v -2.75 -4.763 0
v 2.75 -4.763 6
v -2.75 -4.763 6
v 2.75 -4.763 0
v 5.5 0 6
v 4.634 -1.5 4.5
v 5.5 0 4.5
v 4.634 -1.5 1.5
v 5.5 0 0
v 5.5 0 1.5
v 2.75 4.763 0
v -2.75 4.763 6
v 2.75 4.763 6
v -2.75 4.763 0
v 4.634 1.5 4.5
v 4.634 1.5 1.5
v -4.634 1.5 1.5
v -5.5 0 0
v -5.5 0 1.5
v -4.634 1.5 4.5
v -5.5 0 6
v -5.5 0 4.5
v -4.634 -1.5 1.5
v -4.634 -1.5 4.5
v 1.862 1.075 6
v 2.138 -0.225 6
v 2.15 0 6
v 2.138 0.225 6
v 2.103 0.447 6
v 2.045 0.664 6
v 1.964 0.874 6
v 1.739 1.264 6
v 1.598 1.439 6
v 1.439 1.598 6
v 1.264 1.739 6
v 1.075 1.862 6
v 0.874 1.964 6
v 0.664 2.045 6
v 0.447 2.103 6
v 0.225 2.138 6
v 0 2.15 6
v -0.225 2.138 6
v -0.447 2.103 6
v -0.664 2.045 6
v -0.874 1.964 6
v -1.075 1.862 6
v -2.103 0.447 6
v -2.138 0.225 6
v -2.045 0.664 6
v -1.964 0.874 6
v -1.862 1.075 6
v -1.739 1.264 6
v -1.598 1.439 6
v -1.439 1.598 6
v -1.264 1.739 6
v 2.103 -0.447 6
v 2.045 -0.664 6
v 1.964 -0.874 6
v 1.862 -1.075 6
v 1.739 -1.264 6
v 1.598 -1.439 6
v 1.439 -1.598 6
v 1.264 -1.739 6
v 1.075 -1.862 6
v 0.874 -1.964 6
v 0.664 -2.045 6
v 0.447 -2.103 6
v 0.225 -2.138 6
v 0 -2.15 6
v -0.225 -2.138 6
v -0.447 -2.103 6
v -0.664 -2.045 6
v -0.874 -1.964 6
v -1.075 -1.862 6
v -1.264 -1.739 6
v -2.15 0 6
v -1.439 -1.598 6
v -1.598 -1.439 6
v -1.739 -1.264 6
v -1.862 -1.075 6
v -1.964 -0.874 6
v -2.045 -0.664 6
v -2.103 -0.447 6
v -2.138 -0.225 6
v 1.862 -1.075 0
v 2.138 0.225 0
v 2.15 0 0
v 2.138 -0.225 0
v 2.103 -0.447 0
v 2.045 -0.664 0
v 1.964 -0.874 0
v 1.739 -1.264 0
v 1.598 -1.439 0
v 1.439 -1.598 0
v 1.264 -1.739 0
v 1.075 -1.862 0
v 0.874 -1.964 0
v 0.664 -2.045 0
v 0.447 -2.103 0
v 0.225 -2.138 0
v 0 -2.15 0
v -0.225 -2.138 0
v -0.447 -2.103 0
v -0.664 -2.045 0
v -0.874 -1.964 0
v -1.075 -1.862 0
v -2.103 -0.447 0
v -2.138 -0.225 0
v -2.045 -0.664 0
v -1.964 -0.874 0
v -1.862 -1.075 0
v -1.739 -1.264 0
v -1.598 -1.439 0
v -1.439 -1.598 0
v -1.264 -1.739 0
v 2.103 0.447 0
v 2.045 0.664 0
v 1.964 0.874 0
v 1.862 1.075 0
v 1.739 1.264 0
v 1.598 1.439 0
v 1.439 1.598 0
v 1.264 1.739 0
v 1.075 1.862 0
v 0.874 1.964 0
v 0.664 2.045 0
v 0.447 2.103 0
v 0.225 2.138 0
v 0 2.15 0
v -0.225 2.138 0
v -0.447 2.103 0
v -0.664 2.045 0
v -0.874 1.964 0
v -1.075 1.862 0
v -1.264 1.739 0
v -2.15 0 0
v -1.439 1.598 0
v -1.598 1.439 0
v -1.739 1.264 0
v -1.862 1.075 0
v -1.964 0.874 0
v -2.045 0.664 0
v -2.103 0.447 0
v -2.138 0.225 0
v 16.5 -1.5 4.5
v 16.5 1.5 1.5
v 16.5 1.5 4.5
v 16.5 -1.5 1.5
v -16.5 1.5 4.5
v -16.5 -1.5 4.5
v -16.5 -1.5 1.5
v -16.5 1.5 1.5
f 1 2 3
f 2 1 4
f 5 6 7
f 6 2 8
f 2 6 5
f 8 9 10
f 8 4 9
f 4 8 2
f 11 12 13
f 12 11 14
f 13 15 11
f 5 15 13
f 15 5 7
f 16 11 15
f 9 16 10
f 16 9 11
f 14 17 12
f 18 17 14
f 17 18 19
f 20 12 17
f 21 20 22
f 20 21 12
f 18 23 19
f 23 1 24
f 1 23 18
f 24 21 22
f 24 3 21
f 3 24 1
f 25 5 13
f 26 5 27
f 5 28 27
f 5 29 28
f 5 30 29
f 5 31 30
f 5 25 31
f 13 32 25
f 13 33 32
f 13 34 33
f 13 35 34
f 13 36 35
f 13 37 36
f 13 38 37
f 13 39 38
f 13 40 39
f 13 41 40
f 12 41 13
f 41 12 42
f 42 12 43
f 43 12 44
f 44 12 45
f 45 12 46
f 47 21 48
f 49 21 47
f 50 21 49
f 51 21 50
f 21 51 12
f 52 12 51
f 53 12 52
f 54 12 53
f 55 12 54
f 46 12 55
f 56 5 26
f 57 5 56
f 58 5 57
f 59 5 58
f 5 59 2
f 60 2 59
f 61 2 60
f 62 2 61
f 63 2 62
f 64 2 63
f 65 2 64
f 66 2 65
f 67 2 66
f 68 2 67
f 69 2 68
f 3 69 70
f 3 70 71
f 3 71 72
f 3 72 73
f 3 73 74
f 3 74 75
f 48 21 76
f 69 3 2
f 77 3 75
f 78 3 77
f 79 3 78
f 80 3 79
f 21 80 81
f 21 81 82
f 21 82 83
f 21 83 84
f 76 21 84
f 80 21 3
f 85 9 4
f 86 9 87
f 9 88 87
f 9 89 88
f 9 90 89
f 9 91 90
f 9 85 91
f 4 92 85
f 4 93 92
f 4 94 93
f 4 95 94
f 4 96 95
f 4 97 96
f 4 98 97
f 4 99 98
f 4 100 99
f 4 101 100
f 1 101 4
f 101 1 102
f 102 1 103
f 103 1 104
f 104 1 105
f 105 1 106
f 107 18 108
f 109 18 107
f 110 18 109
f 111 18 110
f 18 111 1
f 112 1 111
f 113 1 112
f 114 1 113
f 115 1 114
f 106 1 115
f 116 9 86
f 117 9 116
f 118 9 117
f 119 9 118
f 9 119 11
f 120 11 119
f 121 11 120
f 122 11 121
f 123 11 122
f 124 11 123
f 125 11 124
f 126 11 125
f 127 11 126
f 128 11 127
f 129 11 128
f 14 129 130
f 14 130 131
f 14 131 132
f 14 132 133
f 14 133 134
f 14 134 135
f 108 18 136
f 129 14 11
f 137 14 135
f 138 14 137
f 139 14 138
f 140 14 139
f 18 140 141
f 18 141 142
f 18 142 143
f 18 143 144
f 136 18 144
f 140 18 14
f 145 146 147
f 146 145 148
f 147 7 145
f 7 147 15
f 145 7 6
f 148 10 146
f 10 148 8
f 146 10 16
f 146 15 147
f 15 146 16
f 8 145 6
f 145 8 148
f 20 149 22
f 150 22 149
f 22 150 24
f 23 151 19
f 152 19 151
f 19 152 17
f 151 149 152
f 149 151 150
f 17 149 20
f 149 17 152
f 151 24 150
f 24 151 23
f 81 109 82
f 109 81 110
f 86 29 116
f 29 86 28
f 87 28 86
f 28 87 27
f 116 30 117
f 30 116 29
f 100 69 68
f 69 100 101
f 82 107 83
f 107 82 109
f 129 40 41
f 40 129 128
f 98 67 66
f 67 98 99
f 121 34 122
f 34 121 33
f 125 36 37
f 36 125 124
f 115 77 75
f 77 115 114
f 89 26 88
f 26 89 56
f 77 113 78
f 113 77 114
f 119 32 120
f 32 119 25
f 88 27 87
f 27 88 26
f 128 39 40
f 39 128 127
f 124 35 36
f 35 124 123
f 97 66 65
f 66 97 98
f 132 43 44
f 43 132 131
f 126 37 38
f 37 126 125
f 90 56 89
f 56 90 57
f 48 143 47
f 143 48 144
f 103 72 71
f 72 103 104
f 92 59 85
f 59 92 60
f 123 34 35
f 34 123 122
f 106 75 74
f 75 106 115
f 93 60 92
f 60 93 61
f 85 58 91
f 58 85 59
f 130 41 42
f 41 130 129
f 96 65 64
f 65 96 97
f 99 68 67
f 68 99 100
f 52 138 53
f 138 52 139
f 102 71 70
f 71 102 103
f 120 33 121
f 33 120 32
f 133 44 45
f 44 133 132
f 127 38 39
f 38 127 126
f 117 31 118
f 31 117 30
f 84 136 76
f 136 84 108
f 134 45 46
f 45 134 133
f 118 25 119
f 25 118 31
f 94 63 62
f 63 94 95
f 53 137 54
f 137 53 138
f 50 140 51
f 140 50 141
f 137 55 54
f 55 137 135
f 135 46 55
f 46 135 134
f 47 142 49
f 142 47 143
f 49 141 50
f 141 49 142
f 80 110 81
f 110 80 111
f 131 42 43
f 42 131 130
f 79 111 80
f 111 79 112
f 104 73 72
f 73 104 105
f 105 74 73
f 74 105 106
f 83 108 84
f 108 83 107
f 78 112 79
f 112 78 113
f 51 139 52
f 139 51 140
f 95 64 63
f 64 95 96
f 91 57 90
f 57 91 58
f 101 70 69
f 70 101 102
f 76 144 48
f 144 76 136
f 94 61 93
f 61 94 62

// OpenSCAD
// Wing nut with two reinforced wings.
$fn = 60;
eps = 0.02;
thread_d = 4.3;
body_d = 11;
body_h = 6;
wing_l = 12;
wing_t = 3;
difference() {
    union() {
        cylinder(d = body_d, h = body_h, $fn = 6);
        translate([body_d / 2 - 1, -wing_t / 2, body_h / 2 - wing_t / 2]) cube([wing_l, wing_t, wing_t]);
        translate([-body_d / 2 - wing_l + 1, -wing_t / 2, body_h / 2 - wing_t / 2]) cube([wing_l, wing_t, wing_t]);
    }
    translate([0, 0, -eps]) cylinder(d = thread_d, h = body_h + 2 * eps);
}
